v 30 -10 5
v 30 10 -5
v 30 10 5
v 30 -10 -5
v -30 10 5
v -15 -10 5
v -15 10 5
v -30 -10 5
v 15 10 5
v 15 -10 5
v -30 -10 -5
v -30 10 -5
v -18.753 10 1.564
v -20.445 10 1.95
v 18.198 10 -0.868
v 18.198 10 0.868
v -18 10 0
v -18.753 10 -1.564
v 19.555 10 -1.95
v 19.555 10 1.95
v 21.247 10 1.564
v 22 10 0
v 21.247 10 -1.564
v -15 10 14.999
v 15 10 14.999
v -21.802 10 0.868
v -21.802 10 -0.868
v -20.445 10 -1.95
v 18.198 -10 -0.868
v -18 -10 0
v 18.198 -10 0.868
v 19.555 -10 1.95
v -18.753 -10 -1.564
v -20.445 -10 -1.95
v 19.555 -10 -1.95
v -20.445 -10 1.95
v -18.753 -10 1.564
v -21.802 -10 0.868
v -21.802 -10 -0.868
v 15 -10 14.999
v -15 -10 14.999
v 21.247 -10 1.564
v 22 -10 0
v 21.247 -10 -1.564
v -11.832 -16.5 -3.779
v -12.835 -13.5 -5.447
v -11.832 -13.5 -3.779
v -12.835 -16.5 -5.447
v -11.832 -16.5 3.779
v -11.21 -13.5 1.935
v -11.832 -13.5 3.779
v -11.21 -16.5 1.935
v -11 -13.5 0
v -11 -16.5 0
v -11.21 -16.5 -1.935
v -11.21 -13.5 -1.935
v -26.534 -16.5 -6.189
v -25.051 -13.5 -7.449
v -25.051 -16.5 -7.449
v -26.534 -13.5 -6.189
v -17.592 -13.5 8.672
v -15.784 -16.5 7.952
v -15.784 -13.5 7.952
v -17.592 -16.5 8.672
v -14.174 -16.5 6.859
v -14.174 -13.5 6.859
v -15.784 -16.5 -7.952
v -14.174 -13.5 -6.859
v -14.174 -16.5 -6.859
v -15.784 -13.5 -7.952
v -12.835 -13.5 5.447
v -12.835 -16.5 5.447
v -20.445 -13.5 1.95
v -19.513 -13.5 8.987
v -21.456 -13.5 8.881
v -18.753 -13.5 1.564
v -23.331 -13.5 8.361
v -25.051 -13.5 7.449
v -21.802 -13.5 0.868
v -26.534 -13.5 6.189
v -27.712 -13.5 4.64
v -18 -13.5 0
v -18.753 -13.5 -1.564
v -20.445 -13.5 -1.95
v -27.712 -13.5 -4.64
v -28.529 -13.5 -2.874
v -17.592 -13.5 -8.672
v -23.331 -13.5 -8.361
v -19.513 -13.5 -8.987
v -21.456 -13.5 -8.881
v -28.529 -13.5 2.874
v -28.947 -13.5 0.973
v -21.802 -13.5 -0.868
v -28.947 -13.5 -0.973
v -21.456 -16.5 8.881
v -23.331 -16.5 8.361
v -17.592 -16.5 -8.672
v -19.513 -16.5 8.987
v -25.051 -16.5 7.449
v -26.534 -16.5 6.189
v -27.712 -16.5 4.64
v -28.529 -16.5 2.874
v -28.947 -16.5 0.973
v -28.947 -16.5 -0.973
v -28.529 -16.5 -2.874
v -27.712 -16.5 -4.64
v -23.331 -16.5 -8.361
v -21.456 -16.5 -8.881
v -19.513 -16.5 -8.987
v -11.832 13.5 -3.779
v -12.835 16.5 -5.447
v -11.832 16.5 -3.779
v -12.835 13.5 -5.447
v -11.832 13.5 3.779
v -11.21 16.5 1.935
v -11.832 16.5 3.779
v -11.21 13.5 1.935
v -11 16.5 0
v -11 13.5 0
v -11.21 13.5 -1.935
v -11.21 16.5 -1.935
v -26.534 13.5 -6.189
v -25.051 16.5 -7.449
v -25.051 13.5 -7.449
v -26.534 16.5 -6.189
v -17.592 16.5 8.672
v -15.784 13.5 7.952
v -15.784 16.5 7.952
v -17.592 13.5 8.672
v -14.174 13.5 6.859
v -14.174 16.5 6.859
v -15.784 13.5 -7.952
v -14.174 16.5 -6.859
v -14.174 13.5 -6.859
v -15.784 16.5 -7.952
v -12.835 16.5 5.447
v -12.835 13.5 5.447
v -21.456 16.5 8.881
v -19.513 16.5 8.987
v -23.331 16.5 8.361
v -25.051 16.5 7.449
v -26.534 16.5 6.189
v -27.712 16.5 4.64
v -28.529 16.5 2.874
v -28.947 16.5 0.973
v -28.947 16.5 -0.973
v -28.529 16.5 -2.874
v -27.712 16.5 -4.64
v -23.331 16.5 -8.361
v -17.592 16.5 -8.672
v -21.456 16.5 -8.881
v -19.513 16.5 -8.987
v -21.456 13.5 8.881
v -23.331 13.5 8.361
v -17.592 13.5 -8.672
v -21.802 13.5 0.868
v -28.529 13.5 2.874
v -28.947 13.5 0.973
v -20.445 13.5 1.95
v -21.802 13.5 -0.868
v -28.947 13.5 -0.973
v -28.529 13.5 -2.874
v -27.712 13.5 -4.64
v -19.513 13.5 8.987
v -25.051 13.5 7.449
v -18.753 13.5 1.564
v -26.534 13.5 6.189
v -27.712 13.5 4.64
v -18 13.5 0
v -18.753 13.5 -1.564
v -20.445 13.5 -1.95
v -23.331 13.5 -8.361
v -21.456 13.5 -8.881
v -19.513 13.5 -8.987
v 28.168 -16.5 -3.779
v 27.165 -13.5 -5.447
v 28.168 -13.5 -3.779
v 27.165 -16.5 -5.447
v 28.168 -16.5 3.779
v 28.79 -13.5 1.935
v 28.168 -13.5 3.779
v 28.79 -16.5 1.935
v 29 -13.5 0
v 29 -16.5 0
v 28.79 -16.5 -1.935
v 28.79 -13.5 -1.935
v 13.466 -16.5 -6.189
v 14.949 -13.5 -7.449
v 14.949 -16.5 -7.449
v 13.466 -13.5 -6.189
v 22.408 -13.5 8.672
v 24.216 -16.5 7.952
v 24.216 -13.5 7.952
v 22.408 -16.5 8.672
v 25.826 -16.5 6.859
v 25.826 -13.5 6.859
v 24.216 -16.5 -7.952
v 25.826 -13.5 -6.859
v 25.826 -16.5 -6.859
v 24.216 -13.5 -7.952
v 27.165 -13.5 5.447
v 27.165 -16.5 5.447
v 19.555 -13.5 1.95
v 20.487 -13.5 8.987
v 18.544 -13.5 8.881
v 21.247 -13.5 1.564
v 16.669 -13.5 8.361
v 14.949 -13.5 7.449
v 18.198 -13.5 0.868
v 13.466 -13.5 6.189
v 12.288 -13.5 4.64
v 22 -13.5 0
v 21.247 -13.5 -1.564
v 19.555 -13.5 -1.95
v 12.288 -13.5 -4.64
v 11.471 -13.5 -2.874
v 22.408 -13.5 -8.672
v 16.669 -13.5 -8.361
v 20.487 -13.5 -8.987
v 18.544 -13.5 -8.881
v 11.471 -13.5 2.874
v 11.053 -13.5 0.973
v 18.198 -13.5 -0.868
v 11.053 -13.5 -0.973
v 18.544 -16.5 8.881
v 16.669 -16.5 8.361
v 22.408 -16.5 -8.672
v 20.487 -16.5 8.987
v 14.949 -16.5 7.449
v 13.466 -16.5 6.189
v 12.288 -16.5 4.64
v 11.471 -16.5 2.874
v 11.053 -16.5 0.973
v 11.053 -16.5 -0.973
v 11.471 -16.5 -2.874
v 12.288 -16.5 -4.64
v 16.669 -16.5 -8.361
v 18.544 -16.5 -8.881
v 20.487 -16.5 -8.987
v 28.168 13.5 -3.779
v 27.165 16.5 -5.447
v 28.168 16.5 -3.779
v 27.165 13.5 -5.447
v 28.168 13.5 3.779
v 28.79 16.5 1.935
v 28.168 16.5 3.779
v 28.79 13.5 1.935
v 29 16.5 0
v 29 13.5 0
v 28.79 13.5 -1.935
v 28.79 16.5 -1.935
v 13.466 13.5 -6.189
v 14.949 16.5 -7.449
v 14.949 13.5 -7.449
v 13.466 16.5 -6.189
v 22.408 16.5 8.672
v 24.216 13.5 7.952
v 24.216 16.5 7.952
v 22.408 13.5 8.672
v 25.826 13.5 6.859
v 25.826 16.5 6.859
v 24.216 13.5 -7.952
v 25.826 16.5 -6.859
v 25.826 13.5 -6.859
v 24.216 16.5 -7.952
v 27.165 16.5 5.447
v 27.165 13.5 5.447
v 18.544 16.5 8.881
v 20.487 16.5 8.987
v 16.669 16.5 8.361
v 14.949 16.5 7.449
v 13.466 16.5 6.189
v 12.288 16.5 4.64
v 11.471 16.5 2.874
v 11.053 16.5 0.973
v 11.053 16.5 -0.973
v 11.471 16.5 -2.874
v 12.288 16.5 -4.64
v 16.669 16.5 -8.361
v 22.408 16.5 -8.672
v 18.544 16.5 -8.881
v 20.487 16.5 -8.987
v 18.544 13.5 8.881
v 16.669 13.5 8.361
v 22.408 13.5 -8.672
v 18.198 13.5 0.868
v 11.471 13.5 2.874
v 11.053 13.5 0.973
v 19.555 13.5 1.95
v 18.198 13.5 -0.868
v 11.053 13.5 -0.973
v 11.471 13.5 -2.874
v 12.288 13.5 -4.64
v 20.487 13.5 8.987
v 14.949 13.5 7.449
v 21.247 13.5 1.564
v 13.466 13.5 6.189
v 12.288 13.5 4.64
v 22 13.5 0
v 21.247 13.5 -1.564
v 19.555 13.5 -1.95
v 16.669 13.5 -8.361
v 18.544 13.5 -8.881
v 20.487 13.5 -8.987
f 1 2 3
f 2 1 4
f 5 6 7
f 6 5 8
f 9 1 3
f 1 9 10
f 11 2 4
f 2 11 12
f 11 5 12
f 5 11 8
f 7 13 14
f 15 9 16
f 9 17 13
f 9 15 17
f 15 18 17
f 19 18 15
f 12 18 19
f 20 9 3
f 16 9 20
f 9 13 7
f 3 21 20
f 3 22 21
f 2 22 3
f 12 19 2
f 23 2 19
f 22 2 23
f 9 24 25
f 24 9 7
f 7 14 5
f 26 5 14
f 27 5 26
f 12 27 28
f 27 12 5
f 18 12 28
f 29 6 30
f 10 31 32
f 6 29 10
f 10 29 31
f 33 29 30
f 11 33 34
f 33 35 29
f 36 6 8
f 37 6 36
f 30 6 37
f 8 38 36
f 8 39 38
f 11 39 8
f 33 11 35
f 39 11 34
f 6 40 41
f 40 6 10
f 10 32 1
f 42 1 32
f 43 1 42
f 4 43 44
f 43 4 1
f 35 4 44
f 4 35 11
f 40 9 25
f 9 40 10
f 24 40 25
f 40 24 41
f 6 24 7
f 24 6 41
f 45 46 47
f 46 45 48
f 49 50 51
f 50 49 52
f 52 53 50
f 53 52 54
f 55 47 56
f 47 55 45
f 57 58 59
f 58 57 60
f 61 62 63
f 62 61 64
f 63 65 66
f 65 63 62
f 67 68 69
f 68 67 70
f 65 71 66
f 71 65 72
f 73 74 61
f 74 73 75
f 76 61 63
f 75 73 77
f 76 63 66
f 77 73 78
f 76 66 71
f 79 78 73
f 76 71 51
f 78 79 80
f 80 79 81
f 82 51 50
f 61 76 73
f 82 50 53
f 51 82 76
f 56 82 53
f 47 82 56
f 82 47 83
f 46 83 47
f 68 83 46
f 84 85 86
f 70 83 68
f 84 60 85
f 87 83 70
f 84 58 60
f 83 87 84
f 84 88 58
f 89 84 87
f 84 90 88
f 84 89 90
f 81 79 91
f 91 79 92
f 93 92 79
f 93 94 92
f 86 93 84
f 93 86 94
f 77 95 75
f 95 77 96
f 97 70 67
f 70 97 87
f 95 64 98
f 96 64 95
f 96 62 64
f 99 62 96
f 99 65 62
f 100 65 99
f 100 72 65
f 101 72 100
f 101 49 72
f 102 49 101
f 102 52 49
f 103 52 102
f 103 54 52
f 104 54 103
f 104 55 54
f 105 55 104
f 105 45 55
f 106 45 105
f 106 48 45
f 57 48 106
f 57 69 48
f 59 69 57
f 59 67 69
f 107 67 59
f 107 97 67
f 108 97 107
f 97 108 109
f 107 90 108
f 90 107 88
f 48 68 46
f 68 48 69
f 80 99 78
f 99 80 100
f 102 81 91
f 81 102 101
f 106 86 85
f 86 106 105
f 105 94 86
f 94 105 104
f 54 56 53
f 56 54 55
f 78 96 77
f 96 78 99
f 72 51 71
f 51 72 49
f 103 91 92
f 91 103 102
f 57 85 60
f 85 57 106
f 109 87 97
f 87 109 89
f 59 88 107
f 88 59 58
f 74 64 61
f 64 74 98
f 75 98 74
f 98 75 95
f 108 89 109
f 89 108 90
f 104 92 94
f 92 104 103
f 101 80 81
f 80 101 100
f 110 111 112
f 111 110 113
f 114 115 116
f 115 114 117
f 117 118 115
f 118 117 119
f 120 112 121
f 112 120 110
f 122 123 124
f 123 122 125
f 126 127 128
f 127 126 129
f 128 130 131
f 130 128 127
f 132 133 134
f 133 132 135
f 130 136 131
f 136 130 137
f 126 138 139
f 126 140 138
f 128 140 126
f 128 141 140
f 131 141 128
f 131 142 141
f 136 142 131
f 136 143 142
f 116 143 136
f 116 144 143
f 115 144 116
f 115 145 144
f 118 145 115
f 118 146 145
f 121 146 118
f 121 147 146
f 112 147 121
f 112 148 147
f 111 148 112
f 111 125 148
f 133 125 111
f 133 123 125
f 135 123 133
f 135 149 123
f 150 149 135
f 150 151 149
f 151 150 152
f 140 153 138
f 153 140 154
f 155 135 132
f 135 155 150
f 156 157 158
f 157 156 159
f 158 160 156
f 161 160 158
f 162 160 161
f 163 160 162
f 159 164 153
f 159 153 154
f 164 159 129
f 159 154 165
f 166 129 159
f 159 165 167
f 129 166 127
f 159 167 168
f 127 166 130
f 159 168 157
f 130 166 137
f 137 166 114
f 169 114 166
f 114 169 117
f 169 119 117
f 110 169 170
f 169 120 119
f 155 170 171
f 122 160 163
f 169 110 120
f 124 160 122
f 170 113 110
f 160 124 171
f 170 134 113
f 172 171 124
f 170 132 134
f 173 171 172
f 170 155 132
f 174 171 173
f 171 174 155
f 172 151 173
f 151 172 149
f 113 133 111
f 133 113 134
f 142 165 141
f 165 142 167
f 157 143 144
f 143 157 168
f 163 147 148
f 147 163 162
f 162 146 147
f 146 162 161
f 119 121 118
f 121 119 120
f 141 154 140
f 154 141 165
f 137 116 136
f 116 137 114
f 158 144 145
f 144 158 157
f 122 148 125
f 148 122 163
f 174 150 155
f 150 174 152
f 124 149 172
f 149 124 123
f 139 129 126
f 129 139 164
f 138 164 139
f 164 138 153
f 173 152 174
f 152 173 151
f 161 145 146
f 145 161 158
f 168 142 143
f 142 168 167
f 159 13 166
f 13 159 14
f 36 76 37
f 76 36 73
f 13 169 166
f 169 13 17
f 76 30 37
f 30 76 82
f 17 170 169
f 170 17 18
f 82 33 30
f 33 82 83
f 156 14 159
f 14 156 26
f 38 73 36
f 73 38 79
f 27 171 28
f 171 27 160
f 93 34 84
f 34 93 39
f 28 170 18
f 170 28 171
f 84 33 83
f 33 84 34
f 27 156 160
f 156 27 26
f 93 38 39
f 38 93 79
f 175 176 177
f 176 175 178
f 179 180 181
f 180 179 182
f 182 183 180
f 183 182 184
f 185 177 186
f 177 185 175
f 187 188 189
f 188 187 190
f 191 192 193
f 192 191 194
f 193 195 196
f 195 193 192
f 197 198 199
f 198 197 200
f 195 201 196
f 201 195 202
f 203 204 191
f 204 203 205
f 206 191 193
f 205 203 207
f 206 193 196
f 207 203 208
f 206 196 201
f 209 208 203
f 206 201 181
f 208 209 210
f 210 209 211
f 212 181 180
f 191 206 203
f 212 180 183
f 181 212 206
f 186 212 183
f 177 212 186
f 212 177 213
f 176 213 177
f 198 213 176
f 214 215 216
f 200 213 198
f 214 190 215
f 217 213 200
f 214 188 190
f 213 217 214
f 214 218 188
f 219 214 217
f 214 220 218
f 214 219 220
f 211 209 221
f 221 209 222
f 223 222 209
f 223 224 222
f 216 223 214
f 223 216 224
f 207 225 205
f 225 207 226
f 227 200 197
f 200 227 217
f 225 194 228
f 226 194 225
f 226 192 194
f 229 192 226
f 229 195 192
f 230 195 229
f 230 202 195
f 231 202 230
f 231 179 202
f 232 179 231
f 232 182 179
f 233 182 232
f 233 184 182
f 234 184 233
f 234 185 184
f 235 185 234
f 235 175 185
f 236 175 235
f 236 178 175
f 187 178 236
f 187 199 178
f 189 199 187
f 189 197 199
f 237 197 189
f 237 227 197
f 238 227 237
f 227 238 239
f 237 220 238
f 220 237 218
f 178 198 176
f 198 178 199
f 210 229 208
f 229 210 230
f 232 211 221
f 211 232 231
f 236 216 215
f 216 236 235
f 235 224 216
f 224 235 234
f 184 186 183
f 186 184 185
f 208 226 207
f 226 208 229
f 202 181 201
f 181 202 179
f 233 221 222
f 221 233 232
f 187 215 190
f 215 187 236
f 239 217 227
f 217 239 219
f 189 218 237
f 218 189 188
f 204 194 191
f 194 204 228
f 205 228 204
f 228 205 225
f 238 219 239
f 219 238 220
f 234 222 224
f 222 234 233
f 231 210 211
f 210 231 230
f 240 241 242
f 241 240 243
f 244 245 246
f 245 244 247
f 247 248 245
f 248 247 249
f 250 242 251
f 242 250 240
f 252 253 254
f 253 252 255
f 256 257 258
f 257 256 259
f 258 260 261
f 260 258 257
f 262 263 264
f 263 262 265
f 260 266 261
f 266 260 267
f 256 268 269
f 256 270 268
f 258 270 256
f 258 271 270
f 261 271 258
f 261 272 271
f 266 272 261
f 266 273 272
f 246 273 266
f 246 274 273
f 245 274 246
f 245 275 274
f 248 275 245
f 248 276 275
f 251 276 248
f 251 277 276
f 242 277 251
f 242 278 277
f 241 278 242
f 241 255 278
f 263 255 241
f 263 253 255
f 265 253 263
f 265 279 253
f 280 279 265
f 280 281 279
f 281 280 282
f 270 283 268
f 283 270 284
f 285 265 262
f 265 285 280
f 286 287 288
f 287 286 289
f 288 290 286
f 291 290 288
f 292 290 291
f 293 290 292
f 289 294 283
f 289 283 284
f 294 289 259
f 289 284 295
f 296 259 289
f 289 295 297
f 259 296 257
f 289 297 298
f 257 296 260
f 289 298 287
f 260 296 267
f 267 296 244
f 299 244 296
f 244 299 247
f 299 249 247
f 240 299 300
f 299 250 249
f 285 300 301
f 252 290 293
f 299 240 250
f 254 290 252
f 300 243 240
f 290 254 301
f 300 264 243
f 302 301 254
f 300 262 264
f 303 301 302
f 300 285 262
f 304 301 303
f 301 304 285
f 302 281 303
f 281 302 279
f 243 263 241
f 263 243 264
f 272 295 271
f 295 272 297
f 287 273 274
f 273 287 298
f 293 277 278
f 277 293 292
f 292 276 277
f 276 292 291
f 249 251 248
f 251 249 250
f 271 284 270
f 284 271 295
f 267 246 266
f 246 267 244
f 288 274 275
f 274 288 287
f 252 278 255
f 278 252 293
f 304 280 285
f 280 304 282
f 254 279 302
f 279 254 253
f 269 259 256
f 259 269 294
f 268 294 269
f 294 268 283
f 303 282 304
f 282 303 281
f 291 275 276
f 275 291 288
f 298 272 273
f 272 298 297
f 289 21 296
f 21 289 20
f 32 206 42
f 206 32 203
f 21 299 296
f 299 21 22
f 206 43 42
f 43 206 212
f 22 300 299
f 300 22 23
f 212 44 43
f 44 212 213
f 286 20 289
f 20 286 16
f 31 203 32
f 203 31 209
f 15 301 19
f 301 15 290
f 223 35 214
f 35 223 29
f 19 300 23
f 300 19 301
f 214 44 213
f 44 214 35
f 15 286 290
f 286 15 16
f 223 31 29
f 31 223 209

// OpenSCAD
cube([60,20,10],center=true);
translate([0,0,10-0.001])
    cube([30,20,10],center=true);
// left front wheel
translate([-20,-15,0])
rotate([90,0,0])
    cylinder(h=3, r=9, center=true);
    
// right front wheel
translate([-20,15,0])
rotate([90,0,0])
    cylinder(h=3, r=9, center=true);
    
// front axis
translate([-20,0,0])
rotate([90,0,0])
    cylinder(h=30, r=2, center=true);
    
// left back wheel
translate([20,-15,0])
rotate([90,0,0])
    cylinder(h=3, r=9, center=true);
    
// right back wheel
translate([20,15,0])
rotate([90,0,0])
    cylinder(h=3, r=9, center=true);
    
// back axis
translate([20,0,0])
rotate([90,0,0])
    cylinder(h=30, r=2, center=true);
